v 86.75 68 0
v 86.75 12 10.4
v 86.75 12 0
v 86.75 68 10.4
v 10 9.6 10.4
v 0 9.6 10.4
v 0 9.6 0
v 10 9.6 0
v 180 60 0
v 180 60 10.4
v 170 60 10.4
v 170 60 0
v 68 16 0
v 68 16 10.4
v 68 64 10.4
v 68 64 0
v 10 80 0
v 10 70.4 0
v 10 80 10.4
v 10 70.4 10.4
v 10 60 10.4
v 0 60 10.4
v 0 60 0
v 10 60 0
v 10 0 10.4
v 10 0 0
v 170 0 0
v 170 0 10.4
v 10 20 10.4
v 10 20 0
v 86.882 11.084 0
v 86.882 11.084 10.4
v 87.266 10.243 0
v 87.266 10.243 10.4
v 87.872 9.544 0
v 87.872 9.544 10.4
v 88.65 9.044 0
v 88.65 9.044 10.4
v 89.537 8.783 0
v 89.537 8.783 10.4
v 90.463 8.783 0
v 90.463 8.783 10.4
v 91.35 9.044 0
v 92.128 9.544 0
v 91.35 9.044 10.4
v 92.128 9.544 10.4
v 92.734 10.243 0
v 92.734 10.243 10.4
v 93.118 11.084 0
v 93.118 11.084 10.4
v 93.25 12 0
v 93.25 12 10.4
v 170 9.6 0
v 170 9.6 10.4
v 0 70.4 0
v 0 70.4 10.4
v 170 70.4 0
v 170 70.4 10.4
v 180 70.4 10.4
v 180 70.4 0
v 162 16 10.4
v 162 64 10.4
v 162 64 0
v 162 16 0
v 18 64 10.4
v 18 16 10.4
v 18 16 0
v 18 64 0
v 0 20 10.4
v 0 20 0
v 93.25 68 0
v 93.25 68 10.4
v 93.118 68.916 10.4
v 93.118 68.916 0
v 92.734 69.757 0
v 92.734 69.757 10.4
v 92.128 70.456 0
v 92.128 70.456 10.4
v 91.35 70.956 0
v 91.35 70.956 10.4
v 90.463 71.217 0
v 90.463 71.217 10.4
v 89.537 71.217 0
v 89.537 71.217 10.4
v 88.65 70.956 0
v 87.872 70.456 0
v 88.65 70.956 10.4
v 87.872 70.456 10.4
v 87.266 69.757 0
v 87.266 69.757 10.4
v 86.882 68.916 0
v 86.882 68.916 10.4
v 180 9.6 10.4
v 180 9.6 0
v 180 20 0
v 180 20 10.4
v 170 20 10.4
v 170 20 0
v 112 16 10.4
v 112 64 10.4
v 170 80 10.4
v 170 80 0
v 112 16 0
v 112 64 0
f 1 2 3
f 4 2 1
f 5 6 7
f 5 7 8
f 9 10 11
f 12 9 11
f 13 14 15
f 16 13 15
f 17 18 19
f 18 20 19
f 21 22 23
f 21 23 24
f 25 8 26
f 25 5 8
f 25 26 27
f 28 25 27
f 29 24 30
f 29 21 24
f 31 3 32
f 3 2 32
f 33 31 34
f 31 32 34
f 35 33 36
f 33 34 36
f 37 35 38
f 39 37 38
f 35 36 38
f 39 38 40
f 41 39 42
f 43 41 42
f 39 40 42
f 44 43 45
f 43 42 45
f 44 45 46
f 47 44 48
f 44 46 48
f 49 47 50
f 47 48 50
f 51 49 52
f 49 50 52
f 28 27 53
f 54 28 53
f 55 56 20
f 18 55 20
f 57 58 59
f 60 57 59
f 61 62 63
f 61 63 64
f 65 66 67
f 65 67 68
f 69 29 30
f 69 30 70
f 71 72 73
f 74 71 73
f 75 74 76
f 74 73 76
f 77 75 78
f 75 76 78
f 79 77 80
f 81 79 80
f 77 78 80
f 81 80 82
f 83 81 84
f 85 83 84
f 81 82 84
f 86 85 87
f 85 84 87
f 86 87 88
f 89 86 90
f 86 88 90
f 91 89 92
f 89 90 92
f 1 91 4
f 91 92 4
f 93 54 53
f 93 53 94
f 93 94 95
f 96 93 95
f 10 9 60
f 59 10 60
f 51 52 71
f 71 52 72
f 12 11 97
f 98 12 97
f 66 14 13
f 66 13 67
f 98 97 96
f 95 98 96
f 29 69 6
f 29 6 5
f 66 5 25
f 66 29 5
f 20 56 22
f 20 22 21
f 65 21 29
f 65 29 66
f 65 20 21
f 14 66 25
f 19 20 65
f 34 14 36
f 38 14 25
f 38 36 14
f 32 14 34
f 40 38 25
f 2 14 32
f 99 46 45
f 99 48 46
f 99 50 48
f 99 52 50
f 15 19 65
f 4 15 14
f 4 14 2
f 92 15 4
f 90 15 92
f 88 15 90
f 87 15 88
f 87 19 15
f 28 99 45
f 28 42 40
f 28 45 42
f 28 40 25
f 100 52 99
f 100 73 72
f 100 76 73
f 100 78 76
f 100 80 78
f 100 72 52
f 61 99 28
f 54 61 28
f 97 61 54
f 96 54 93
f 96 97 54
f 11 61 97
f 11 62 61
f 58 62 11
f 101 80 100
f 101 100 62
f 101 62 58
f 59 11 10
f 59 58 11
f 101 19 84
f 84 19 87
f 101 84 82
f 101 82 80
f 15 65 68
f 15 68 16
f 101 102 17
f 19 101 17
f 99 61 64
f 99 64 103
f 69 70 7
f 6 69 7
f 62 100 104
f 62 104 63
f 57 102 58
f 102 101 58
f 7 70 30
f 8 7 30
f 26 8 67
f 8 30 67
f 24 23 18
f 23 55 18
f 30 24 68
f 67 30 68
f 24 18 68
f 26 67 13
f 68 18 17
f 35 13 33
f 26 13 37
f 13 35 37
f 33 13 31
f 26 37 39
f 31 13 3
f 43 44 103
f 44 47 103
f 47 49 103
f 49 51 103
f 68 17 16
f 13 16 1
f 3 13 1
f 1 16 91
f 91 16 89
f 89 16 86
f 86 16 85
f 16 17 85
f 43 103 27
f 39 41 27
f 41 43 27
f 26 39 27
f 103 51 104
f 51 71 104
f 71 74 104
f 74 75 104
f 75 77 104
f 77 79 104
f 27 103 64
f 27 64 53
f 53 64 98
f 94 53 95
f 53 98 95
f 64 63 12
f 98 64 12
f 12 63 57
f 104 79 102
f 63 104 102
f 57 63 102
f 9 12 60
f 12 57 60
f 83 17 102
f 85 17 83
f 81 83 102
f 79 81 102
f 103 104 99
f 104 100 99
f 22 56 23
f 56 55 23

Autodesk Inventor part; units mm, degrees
ref_plane "YZ Plane" through (0, 0, 0) normal (1, 0, 0) x (0, 1, 0)
ref_plane "XZ Plane" through (0, 0, 0) normal (0, 1, 0) x (-1, 0, 0)
ref_plane "XY Plane" through (0, 0, 0) normal (0, 0, 1) x (1, 0, 0)
sketch "Sketch1" plane through (0, 0, 0) normal (0, 0, 1) x (1, 0, 0)
  line L0 (0, 0) -> (180, 0)
  line L1 (180, 0) -> (180, 80)
  line L2 (180, 80) -> (0, 80)
  line L3 (0, 80) -> (0, 0)
  dimension "d0" = 180
  dimension "d1" = 80
extrude "Extrusion1" add sketch "Sketch1" along normal blind 10.4
sketch "Sketch2" plane through (0, 0, 10.4) normal (0, 0, 1) x (1, 0, 0)
  line L0 (0, 80) -> (0, 0) projected
  line L1 (0, 60) -> (10, 60)
  line L2 (10, 60) -> (10, 20)
  line L3 (10, 20) -> (0, 20)
  line L4 (0, 9.6) -> (10, 9.6)
  line L5 (10, 9.6) -> (10, 0)
  line L6 (0, 0) -> (180, 0) projected
  line L7 (0, 70.4) -> (10, 70.4)
  line L8 (10, 70.4) -> (10, 80)
  line L9 (180, 80) -> (0, 80) projected
  line L10 (170, 80) -> (170, 70.4)
  line L11 (170, 70.4) -> (180, 70.4)
  line L12 (180, 0) -> (180, 80) projected
  line L13 (180, 60) -> (170, 60)
  line L14 (170, 60) -> (170, 20)
  line L15 (170, 20) -> (180, 20)
  line L16 (170, 0) -> (170, 9.6)
  line L17 (170, 9.6) -> (180, 9.6)
  line L18 (162, 64) -> (162, 16)
  line L19 (18, 16) -> (18, 64)
  line L20 (112, 64) -> (112, 16)
  line L21 (68, 16) -> (68, 64)
  line L22 (18, 64) -> (68, 64)
  line L23 (112, 64) -> (162, 64)
  line L24 (162, 16) -> (112, 16)
  line L25 (68, 16) -> (18, 16)
  line L26 (93.25, 12) -> (93.25, 68)
  line L27 (86.75, 12) -> (86.75, 68)
  arc A0 (86.75, 12) -> (93.25, 12) centre (90, 12) ccw
  arc A1 (93.25, 68) -> (86.75, 68) centre (90, 68) ccw
  dimension "d4" = 40
  dimension "d5" = 10.4
  dimension "d6" = 10.4
  dimension "d7" = 9.6
  dimension "d8" = 10
  dimension "d9" = 40
  dimension "d10" = 10.4
  dimension "d11" = 10.4
  dimension "d13" = 10
  dimension "d14" = 10
  dimension "d15" = 9.6
  dimension "d19" = 8
  dimension "d21" = 8
  dimension "d22" = 50
  dimension "d23" = 50
  dimension "d24" = 16
  dimension "d25" = 16
  dimension "d26" = 16
  dimension "d27" = 16
  dimension "d31" = 12
  dimension "d32" = 12
  dimension "d33" = 6.5
  dimension "d34" = 18.75
extrude "Extrusion2" cut sketch "Sketch2" against normal up to next contours L9 L8 L7 L0 | L1 L2 L3 L0 | L9 L12 L11 L10 | L4 L5 L6 L0 | L12 L15 L14 L13 | L16 L17 L12 L6 | L18 L24 L20 L23 | L19 L22 L21 L25 | A0 L27 A1 L26
equation "\"d24\" = d26"
equation "\"d25\" = d26"
equation "\"d27\" = d26"
properties part number "center mount"
